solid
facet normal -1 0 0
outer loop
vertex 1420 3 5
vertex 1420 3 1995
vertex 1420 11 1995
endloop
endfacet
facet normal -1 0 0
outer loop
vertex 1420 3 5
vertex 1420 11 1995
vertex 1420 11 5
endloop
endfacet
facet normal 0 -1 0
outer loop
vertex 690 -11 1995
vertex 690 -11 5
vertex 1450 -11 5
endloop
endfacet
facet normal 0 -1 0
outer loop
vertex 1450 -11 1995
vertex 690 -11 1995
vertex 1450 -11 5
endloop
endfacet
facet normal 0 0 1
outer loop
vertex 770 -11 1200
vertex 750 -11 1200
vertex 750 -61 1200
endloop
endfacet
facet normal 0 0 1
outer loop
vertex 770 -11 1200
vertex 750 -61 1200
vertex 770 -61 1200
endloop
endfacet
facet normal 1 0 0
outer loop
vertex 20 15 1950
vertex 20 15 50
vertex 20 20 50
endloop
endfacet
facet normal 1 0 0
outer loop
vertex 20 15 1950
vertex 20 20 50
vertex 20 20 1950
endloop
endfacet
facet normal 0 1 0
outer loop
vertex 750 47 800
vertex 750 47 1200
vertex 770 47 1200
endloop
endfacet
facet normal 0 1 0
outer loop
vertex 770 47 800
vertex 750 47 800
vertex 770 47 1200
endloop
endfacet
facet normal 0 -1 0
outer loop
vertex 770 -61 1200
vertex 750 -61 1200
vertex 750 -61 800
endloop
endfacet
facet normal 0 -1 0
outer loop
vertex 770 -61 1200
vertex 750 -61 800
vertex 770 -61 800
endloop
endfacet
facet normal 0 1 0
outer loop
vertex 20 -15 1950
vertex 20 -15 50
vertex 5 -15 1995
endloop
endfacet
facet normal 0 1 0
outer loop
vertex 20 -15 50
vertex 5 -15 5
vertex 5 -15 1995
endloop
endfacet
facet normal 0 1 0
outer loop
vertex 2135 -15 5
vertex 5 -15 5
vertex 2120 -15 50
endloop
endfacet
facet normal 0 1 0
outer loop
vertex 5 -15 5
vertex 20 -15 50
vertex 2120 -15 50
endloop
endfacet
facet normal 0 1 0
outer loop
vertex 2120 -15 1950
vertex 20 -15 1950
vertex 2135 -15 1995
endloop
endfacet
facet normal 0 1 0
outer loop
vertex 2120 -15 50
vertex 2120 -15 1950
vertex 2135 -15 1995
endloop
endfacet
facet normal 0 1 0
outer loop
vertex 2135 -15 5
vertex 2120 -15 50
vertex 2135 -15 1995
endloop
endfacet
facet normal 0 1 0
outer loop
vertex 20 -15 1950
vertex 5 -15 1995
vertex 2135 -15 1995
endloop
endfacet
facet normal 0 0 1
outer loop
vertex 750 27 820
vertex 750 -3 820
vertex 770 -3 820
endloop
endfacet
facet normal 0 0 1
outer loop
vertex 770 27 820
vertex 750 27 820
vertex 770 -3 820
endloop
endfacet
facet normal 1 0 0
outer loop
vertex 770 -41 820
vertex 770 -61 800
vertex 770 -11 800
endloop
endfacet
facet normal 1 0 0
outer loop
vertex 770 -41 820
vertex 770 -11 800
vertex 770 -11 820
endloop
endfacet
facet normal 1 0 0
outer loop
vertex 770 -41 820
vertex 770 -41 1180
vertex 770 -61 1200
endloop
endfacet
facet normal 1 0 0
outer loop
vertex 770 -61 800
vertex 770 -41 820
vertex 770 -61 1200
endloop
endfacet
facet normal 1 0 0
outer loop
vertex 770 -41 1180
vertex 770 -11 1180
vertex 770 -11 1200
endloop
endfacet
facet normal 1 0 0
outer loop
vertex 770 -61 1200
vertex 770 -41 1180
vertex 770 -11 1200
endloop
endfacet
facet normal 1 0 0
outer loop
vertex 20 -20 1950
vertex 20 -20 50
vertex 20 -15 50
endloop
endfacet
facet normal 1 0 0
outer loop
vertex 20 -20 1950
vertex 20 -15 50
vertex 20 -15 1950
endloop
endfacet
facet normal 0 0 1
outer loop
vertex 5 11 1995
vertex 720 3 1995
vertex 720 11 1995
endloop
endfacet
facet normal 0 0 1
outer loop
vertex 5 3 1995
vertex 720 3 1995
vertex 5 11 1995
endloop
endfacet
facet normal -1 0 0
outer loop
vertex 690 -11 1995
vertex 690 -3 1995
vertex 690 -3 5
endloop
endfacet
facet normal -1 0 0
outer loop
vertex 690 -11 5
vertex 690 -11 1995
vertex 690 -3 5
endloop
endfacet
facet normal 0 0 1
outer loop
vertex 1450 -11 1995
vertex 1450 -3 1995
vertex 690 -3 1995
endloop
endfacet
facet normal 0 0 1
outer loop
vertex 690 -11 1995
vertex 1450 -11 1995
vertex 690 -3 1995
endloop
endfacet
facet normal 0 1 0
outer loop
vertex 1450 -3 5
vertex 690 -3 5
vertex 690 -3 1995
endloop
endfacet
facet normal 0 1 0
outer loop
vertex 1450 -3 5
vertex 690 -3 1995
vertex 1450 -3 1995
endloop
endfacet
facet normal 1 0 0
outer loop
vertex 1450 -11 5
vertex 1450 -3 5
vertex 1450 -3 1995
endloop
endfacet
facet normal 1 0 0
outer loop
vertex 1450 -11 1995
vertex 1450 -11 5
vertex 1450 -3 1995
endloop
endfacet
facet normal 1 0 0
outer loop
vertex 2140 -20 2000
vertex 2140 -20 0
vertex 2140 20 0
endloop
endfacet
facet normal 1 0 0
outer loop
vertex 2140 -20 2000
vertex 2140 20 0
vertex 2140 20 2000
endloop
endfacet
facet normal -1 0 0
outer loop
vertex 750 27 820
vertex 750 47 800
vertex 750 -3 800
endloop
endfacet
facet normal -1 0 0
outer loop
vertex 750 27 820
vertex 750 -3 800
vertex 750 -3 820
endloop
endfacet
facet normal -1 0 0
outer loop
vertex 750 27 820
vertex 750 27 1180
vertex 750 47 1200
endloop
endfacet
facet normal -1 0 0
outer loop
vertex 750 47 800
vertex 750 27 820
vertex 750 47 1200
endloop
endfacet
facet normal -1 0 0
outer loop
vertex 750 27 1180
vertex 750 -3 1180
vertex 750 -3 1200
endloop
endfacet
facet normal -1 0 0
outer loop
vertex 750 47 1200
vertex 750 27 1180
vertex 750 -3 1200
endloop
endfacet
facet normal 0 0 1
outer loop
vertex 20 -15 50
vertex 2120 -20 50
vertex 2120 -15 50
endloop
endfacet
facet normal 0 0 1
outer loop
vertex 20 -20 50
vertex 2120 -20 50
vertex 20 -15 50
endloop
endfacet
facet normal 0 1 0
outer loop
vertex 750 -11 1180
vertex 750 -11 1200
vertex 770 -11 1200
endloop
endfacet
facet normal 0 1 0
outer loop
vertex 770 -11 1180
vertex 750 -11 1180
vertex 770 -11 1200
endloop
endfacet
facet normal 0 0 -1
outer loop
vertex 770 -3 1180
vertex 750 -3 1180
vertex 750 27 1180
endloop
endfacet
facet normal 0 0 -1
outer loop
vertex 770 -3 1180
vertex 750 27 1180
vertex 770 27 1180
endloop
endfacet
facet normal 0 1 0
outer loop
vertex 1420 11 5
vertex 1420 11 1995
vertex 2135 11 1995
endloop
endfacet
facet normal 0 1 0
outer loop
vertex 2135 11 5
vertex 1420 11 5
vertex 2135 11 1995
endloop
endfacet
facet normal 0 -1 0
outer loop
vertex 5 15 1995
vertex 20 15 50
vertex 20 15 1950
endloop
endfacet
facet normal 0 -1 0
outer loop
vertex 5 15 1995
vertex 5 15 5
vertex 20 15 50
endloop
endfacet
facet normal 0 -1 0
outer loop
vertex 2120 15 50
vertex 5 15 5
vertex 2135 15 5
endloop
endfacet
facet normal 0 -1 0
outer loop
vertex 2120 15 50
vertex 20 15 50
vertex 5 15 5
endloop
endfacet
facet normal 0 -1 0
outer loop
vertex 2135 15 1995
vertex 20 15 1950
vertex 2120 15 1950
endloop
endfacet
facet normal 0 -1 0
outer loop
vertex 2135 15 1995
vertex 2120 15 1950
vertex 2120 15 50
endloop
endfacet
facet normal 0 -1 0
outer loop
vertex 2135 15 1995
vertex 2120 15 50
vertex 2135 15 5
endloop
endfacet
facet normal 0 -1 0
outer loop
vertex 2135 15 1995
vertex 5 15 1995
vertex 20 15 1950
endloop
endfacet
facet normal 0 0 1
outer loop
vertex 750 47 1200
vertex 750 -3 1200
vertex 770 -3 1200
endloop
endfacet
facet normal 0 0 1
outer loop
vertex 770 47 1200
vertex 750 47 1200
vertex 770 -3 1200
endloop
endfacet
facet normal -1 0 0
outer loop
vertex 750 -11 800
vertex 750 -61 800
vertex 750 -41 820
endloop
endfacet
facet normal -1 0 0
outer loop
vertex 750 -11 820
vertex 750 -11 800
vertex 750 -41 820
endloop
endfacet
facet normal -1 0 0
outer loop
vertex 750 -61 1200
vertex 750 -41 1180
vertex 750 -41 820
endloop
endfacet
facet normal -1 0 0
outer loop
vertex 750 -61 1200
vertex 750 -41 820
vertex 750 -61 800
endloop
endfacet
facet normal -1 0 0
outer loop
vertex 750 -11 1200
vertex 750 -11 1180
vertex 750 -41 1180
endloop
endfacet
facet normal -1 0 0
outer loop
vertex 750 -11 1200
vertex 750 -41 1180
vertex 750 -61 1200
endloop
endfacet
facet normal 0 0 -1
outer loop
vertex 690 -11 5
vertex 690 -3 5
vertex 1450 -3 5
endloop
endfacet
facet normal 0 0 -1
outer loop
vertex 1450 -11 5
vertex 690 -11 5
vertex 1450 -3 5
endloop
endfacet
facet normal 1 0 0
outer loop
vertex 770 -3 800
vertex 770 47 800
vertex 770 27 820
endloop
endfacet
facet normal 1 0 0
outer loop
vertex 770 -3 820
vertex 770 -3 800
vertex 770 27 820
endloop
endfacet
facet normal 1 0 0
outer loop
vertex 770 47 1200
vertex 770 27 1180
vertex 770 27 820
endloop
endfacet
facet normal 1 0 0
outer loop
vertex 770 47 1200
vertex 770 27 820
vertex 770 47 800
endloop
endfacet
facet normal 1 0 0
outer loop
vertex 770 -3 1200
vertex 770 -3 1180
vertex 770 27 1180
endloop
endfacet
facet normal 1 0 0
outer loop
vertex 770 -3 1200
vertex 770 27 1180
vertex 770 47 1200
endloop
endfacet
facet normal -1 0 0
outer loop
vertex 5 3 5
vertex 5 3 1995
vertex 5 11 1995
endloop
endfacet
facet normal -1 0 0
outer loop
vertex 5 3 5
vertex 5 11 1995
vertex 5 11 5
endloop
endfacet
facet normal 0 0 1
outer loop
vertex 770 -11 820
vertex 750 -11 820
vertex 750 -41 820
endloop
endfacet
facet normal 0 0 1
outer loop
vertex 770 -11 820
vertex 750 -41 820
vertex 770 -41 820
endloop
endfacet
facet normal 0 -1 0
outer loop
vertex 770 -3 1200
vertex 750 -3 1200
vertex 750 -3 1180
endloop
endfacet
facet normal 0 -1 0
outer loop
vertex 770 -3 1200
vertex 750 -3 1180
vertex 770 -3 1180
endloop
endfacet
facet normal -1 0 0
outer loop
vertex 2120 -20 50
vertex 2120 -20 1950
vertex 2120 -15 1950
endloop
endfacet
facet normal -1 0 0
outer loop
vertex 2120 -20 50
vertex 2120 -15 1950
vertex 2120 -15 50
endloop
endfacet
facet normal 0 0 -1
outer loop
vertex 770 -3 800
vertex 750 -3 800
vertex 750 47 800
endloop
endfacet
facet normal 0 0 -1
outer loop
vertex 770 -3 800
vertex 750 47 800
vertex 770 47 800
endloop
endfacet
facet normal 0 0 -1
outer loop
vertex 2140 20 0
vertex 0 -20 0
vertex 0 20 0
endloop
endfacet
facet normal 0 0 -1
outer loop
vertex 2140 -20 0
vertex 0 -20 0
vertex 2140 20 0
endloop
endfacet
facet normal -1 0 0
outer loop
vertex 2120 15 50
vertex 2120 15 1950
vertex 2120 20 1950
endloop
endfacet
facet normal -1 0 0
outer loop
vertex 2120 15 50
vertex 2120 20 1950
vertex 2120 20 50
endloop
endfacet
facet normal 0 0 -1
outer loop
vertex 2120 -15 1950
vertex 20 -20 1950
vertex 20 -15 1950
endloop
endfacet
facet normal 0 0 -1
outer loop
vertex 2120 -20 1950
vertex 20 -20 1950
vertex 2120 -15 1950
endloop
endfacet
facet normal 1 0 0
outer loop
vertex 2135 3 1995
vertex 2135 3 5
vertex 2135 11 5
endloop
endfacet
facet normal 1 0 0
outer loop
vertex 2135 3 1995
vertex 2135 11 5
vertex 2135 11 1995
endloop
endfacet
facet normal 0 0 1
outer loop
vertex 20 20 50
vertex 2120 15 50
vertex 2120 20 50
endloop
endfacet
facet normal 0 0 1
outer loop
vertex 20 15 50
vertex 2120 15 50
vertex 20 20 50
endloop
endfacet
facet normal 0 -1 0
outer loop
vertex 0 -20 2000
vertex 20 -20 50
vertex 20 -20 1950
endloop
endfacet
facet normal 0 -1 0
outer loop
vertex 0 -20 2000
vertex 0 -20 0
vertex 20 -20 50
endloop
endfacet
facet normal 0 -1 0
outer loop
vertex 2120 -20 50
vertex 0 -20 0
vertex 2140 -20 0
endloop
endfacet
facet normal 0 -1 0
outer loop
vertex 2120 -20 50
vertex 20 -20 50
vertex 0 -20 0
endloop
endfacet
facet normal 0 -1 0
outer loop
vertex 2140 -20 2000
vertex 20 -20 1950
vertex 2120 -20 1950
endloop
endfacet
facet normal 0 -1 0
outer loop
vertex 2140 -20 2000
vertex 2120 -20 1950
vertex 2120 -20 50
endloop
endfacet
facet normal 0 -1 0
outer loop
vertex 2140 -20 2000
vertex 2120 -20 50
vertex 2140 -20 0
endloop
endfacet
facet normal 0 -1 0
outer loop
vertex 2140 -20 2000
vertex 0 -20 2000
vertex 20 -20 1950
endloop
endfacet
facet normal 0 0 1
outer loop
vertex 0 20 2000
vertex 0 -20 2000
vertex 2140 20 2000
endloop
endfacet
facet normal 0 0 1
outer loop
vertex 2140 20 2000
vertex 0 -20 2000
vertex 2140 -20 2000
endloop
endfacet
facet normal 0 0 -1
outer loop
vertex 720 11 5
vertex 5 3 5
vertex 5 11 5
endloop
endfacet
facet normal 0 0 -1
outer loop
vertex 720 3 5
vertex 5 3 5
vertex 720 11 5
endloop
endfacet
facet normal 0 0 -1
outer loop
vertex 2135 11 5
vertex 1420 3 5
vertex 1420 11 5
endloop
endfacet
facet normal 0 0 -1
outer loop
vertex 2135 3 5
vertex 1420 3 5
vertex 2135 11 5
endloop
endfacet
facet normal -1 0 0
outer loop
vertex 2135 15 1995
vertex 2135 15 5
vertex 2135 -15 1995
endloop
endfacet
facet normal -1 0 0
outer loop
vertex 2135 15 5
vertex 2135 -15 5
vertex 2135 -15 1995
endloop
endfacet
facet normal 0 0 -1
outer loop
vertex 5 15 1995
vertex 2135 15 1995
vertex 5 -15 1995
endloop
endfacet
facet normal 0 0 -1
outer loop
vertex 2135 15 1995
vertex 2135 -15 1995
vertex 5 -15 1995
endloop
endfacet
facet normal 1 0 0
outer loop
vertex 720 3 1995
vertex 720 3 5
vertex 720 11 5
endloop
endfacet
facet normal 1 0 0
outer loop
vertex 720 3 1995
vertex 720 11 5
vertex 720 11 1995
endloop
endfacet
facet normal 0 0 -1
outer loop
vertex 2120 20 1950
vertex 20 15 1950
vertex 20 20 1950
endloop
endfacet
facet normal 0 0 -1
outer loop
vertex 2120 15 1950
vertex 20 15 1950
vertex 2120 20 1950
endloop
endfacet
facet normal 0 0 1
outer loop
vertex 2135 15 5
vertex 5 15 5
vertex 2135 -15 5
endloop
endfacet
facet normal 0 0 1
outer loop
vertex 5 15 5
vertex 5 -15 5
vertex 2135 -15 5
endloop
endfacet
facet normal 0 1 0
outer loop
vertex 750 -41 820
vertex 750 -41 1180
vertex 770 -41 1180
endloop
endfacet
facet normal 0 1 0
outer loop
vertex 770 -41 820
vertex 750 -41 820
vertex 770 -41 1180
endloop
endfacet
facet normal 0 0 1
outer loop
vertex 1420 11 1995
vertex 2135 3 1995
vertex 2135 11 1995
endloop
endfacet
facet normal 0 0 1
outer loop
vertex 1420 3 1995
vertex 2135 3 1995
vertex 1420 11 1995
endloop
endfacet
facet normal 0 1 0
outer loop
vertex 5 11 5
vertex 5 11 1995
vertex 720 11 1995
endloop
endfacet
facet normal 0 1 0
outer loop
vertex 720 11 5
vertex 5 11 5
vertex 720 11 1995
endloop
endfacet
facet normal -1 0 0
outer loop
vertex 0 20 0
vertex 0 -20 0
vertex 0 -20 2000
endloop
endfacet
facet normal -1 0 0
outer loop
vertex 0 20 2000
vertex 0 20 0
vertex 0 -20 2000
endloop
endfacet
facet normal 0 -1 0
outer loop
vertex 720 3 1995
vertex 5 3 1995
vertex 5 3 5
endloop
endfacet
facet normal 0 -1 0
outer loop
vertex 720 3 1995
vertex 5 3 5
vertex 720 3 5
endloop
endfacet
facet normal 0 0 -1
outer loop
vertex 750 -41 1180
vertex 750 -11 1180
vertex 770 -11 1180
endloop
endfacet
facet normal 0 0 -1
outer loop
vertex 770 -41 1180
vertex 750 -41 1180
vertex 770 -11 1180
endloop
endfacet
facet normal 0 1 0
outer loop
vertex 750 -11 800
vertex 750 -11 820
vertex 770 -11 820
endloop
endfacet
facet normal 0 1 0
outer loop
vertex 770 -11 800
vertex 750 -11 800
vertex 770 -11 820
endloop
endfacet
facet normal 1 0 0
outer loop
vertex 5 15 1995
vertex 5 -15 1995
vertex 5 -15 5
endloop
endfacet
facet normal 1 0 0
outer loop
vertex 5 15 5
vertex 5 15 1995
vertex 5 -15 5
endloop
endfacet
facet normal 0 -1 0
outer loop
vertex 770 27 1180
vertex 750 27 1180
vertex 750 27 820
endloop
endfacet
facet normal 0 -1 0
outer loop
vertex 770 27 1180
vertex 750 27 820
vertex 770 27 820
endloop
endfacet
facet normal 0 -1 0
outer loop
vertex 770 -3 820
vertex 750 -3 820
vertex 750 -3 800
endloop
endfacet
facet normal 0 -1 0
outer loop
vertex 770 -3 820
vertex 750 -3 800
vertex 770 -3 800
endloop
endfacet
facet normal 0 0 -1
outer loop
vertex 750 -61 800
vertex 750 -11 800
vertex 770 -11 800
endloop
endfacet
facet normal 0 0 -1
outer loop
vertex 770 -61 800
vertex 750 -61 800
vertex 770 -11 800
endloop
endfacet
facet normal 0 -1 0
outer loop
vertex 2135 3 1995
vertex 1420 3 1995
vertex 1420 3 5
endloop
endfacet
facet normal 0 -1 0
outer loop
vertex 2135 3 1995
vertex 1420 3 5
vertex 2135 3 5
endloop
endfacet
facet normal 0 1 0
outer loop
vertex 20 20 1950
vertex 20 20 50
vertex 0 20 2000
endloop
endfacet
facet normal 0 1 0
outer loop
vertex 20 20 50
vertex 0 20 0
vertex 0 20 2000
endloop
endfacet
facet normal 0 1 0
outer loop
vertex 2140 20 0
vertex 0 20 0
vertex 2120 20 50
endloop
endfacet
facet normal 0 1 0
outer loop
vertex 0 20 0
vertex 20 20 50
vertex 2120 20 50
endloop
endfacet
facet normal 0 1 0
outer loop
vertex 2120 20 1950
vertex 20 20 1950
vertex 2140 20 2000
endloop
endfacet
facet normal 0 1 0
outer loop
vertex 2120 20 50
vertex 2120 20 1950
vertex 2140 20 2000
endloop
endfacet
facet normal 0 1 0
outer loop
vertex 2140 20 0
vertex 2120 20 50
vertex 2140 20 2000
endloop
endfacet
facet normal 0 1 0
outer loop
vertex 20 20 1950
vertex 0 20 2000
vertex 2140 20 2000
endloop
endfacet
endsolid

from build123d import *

# Parameters (mm, degrees)
F0_W          = 2140
F0_H          = 2000
F0_W_2        = 700
F0_H_2        = 45
F0_W_3        = 30
F1_DEPTH      = 20
F1_DEPTH_BACK = 20
F2_DEPTH      = 15
F2_DEPTH_BACK = 15
F3_START      = -3
F0_W_4        = 670
F0_H_3        = 1900
F3_DEPTH      = 8
F4_START      = 3
F4_DEPTH      = 8
F5_W          = 20
F5_H          = 20
F6_DEPTH      = 50
F7_START      = 30
F5_H_2        = 360
F7_DEPTH      = 20


with BuildPart() as f1:
    # F0 (on Front) → F1 (new body, two sides)
    with BuildSketch(Plane.XZ) as f1_sk:
        with Locations((1070, 1000)):
            Rectangle(F0_W, F0_H)
        Polygon((5, 5), (5, 1995), (690, 1995), (720, 1995), (1420, 1995), (1450, 1995), (2135, 1995), (2135, 5), (1450, 5), (1420, 5), (720, 5), (690, 5), align=None, mode=Mode.SUBTRACT)
        Polygon((690, 1995), (5, 1995), (5, 5), (690, 5), (690, 50), (20, 50), (20, 1950), (690, 1950), align=None)
        Polygon((2135, 1995), (1450, 1995), (1450, 1950), (2120, 1950), (2120, 50), (1450, 50), (1450, 5), (2135, 5), align=None)
        with Locations((1070, 1972.5)):
            Rectangle(F0_W_2, F0_H_2)
        with Locations((1070, 27.5)):
            Rectangle(F0_W_2, F0_H_2)
        with Locations((705, 1972.5)):
            Rectangle(F0_W_3, F0_H_2)
        with Locations((1435, 1972.5)):
            Rectangle(F0_W_3, F0_H_2)
        with Locations((705, 27.5)):
            Rectangle(F0_W_3, F0_H_2)
        with Locations((1435, 27.5)):
            Rectangle(F0_W_3, F0_H_2)
    extrude(amount=F1_DEPTH)
    extrude(f1_sk.sketch, amount=-F1_DEPTH_BACK)

    # F0 (on Front) → F2 (cut, two sides)
    with BuildSketch(Plane.XZ) as f2_sk:
        Polygon((690, 1995), (5, 1995), (5, 5), (690, 5), (690, 50), (20, 50), (20, 1950), (690, 1950), align=None)
        with Locations((705, 1972.5)):
            Rectangle(F0_W_3, F0_H_2)
        with Locations((1070, 1972.5)):
            Rectangle(F0_W_2, F0_H_2)
        with Locations((1435, 1972.5)):
            Rectangle(F0_W_3, F0_H_2)
        Polygon((2135, 1995), (1450, 1995), (1450, 1950), (2120, 1950), (2120, 50), (1450, 50), (1450, 5), (2135, 5), align=None)
        with Locations((705, 27.5)):
            Rectangle(F0_W_3, F0_H_2)
        with Locations((1070, 27.5)):
            Rectangle(F0_W_2, F0_H_2)
        with Locations((1435, 27.5)):
            Rectangle(F0_W_3, F0_H_2)
    extrude(amount=F2_DEPTH, mode=Mode.SUBTRACT)
    extrude(f2_sk.sketch, amount=-F2_DEPTH_BACK, mode=Mode.SUBTRACT)


with BuildPart() as f3:
    # F0 (on Front) → F3 (new body)
    with BuildSketch(Plane.XZ.offset(F3_START)):
        with Locations((355, 1000)):
            Rectangle(F0_W_4, F0_H_3)
        Polygon((690, 1995), (5, 1995), (5, 5), (690, 5), (690, 50), (20, 50), (20, 1950), (690, 1950), align=None)
        with Locations((705, 1972.5)):
            Rectangle(F0_W_3, F0_H_2)
        with Locations((705, 1000)):
            Rectangle(F0_W_3, F0_H_3)
        with Locations((705, 27.5)):
            Rectangle(F0_W_3, F0_H_2)
    extrude(amount=-F3_DEPTH)


with BuildPart() as f3b:
    # F0 (on Front) → F3, piece 2 (new body)
    with BuildSketch(Plane.XZ.offset(F3_START)):
        with Locations((1785, 1000)):
            Rectangle(F0_W_4, F0_H_3)
        Polygon((2135, 1995), (1450, 1995), (1450, 1950), (2120, 1950), (2120, 50), (1450, 50), (1450, 5), (2135, 5), align=None)
        with Locations((1435, 1972.5)):
            Rectangle(F0_W_3, F0_H_2)
        with Locations((1435, 1000)):
            Rectangle(F0_W_3, F0_H_3)
        with Locations((1435, 27.5)):
            Rectangle(F0_W_3, F0_H_2)
    extrude(amount=-F3_DEPTH)


with BuildPart() as f4:
    # F0 (on Front) → F4 (new body)
    with BuildSketch(Plane.XZ.offset(F4_START)):
        with Locations((1070, 1972.5)):
            Rectangle(F0_W_2, F0_H_2)
        with Locations((1070, 1000)):
            Rectangle(F0_W_2, F0_H_3)
        with Locations((1435, 1972.5)):
            Rectangle(F0_W_3, F0_H_2)
        with Locations((1435, 1000)):
            Rectangle(F0_W_3, F0_H_3)
        with Locations((705, 1972.5)):
            Rectangle(F0_W_3, F0_H_2)
        with Locations((705, 1000)):
            Rectangle(F0_W_3, F0_H_3)
        with Locations((705, 27.5)):
            Rectangle(F0_W_3, F0_H_2)
        with Locations((1070, 27.5)):
            Rectangle(F0_W_2, F0_H_2)
        with Locations((1435, 27.5)):
            Rectangle(F0_W_3, F0_H_2)
    extrude(amount=F4_DEPTH)


with BuildPart() as f6:
    # F5 (on face) → F6 (new body)
    with BuildSketch(Plane.XZ.offset(11)):
        with Locations((760, 1190)):
            Rectangle(F5_W, F5_H)
    extrude(amount=F6_DEPTH)



with BuildPart() as f6b:
    # F5 (on face) → F6, piece 2 (new body)
    with BuildSketch(Plane.XZ.offset(11)):
        with Locations((760, 810)):
            Rectangle(F5_W, F5_H)
    extrude(amount=F6_DEPTH)


with BuildPart() as f6_1:
    add(f6.part)

    add(f6b.part)  # F7 merges F6b
    # F5 (on face) → F7 (join)
    with BuildSketch(Plane.XZ.offset(11).offset(F7_START)):
        with Locations((760, 1000)):
            Rectangle(F5_W, F5_H_2)
    extrude(amount=F7_DEPTH)


with BuildPart() as f9_1:
    # F9: instance of F6
    add(f6_1.part.mirror(Plane.XZ.offset(7)))


solid = Compound([f1.part, f3.part, f3b.part, f4.part, f6_1.part, f9_1.part])
